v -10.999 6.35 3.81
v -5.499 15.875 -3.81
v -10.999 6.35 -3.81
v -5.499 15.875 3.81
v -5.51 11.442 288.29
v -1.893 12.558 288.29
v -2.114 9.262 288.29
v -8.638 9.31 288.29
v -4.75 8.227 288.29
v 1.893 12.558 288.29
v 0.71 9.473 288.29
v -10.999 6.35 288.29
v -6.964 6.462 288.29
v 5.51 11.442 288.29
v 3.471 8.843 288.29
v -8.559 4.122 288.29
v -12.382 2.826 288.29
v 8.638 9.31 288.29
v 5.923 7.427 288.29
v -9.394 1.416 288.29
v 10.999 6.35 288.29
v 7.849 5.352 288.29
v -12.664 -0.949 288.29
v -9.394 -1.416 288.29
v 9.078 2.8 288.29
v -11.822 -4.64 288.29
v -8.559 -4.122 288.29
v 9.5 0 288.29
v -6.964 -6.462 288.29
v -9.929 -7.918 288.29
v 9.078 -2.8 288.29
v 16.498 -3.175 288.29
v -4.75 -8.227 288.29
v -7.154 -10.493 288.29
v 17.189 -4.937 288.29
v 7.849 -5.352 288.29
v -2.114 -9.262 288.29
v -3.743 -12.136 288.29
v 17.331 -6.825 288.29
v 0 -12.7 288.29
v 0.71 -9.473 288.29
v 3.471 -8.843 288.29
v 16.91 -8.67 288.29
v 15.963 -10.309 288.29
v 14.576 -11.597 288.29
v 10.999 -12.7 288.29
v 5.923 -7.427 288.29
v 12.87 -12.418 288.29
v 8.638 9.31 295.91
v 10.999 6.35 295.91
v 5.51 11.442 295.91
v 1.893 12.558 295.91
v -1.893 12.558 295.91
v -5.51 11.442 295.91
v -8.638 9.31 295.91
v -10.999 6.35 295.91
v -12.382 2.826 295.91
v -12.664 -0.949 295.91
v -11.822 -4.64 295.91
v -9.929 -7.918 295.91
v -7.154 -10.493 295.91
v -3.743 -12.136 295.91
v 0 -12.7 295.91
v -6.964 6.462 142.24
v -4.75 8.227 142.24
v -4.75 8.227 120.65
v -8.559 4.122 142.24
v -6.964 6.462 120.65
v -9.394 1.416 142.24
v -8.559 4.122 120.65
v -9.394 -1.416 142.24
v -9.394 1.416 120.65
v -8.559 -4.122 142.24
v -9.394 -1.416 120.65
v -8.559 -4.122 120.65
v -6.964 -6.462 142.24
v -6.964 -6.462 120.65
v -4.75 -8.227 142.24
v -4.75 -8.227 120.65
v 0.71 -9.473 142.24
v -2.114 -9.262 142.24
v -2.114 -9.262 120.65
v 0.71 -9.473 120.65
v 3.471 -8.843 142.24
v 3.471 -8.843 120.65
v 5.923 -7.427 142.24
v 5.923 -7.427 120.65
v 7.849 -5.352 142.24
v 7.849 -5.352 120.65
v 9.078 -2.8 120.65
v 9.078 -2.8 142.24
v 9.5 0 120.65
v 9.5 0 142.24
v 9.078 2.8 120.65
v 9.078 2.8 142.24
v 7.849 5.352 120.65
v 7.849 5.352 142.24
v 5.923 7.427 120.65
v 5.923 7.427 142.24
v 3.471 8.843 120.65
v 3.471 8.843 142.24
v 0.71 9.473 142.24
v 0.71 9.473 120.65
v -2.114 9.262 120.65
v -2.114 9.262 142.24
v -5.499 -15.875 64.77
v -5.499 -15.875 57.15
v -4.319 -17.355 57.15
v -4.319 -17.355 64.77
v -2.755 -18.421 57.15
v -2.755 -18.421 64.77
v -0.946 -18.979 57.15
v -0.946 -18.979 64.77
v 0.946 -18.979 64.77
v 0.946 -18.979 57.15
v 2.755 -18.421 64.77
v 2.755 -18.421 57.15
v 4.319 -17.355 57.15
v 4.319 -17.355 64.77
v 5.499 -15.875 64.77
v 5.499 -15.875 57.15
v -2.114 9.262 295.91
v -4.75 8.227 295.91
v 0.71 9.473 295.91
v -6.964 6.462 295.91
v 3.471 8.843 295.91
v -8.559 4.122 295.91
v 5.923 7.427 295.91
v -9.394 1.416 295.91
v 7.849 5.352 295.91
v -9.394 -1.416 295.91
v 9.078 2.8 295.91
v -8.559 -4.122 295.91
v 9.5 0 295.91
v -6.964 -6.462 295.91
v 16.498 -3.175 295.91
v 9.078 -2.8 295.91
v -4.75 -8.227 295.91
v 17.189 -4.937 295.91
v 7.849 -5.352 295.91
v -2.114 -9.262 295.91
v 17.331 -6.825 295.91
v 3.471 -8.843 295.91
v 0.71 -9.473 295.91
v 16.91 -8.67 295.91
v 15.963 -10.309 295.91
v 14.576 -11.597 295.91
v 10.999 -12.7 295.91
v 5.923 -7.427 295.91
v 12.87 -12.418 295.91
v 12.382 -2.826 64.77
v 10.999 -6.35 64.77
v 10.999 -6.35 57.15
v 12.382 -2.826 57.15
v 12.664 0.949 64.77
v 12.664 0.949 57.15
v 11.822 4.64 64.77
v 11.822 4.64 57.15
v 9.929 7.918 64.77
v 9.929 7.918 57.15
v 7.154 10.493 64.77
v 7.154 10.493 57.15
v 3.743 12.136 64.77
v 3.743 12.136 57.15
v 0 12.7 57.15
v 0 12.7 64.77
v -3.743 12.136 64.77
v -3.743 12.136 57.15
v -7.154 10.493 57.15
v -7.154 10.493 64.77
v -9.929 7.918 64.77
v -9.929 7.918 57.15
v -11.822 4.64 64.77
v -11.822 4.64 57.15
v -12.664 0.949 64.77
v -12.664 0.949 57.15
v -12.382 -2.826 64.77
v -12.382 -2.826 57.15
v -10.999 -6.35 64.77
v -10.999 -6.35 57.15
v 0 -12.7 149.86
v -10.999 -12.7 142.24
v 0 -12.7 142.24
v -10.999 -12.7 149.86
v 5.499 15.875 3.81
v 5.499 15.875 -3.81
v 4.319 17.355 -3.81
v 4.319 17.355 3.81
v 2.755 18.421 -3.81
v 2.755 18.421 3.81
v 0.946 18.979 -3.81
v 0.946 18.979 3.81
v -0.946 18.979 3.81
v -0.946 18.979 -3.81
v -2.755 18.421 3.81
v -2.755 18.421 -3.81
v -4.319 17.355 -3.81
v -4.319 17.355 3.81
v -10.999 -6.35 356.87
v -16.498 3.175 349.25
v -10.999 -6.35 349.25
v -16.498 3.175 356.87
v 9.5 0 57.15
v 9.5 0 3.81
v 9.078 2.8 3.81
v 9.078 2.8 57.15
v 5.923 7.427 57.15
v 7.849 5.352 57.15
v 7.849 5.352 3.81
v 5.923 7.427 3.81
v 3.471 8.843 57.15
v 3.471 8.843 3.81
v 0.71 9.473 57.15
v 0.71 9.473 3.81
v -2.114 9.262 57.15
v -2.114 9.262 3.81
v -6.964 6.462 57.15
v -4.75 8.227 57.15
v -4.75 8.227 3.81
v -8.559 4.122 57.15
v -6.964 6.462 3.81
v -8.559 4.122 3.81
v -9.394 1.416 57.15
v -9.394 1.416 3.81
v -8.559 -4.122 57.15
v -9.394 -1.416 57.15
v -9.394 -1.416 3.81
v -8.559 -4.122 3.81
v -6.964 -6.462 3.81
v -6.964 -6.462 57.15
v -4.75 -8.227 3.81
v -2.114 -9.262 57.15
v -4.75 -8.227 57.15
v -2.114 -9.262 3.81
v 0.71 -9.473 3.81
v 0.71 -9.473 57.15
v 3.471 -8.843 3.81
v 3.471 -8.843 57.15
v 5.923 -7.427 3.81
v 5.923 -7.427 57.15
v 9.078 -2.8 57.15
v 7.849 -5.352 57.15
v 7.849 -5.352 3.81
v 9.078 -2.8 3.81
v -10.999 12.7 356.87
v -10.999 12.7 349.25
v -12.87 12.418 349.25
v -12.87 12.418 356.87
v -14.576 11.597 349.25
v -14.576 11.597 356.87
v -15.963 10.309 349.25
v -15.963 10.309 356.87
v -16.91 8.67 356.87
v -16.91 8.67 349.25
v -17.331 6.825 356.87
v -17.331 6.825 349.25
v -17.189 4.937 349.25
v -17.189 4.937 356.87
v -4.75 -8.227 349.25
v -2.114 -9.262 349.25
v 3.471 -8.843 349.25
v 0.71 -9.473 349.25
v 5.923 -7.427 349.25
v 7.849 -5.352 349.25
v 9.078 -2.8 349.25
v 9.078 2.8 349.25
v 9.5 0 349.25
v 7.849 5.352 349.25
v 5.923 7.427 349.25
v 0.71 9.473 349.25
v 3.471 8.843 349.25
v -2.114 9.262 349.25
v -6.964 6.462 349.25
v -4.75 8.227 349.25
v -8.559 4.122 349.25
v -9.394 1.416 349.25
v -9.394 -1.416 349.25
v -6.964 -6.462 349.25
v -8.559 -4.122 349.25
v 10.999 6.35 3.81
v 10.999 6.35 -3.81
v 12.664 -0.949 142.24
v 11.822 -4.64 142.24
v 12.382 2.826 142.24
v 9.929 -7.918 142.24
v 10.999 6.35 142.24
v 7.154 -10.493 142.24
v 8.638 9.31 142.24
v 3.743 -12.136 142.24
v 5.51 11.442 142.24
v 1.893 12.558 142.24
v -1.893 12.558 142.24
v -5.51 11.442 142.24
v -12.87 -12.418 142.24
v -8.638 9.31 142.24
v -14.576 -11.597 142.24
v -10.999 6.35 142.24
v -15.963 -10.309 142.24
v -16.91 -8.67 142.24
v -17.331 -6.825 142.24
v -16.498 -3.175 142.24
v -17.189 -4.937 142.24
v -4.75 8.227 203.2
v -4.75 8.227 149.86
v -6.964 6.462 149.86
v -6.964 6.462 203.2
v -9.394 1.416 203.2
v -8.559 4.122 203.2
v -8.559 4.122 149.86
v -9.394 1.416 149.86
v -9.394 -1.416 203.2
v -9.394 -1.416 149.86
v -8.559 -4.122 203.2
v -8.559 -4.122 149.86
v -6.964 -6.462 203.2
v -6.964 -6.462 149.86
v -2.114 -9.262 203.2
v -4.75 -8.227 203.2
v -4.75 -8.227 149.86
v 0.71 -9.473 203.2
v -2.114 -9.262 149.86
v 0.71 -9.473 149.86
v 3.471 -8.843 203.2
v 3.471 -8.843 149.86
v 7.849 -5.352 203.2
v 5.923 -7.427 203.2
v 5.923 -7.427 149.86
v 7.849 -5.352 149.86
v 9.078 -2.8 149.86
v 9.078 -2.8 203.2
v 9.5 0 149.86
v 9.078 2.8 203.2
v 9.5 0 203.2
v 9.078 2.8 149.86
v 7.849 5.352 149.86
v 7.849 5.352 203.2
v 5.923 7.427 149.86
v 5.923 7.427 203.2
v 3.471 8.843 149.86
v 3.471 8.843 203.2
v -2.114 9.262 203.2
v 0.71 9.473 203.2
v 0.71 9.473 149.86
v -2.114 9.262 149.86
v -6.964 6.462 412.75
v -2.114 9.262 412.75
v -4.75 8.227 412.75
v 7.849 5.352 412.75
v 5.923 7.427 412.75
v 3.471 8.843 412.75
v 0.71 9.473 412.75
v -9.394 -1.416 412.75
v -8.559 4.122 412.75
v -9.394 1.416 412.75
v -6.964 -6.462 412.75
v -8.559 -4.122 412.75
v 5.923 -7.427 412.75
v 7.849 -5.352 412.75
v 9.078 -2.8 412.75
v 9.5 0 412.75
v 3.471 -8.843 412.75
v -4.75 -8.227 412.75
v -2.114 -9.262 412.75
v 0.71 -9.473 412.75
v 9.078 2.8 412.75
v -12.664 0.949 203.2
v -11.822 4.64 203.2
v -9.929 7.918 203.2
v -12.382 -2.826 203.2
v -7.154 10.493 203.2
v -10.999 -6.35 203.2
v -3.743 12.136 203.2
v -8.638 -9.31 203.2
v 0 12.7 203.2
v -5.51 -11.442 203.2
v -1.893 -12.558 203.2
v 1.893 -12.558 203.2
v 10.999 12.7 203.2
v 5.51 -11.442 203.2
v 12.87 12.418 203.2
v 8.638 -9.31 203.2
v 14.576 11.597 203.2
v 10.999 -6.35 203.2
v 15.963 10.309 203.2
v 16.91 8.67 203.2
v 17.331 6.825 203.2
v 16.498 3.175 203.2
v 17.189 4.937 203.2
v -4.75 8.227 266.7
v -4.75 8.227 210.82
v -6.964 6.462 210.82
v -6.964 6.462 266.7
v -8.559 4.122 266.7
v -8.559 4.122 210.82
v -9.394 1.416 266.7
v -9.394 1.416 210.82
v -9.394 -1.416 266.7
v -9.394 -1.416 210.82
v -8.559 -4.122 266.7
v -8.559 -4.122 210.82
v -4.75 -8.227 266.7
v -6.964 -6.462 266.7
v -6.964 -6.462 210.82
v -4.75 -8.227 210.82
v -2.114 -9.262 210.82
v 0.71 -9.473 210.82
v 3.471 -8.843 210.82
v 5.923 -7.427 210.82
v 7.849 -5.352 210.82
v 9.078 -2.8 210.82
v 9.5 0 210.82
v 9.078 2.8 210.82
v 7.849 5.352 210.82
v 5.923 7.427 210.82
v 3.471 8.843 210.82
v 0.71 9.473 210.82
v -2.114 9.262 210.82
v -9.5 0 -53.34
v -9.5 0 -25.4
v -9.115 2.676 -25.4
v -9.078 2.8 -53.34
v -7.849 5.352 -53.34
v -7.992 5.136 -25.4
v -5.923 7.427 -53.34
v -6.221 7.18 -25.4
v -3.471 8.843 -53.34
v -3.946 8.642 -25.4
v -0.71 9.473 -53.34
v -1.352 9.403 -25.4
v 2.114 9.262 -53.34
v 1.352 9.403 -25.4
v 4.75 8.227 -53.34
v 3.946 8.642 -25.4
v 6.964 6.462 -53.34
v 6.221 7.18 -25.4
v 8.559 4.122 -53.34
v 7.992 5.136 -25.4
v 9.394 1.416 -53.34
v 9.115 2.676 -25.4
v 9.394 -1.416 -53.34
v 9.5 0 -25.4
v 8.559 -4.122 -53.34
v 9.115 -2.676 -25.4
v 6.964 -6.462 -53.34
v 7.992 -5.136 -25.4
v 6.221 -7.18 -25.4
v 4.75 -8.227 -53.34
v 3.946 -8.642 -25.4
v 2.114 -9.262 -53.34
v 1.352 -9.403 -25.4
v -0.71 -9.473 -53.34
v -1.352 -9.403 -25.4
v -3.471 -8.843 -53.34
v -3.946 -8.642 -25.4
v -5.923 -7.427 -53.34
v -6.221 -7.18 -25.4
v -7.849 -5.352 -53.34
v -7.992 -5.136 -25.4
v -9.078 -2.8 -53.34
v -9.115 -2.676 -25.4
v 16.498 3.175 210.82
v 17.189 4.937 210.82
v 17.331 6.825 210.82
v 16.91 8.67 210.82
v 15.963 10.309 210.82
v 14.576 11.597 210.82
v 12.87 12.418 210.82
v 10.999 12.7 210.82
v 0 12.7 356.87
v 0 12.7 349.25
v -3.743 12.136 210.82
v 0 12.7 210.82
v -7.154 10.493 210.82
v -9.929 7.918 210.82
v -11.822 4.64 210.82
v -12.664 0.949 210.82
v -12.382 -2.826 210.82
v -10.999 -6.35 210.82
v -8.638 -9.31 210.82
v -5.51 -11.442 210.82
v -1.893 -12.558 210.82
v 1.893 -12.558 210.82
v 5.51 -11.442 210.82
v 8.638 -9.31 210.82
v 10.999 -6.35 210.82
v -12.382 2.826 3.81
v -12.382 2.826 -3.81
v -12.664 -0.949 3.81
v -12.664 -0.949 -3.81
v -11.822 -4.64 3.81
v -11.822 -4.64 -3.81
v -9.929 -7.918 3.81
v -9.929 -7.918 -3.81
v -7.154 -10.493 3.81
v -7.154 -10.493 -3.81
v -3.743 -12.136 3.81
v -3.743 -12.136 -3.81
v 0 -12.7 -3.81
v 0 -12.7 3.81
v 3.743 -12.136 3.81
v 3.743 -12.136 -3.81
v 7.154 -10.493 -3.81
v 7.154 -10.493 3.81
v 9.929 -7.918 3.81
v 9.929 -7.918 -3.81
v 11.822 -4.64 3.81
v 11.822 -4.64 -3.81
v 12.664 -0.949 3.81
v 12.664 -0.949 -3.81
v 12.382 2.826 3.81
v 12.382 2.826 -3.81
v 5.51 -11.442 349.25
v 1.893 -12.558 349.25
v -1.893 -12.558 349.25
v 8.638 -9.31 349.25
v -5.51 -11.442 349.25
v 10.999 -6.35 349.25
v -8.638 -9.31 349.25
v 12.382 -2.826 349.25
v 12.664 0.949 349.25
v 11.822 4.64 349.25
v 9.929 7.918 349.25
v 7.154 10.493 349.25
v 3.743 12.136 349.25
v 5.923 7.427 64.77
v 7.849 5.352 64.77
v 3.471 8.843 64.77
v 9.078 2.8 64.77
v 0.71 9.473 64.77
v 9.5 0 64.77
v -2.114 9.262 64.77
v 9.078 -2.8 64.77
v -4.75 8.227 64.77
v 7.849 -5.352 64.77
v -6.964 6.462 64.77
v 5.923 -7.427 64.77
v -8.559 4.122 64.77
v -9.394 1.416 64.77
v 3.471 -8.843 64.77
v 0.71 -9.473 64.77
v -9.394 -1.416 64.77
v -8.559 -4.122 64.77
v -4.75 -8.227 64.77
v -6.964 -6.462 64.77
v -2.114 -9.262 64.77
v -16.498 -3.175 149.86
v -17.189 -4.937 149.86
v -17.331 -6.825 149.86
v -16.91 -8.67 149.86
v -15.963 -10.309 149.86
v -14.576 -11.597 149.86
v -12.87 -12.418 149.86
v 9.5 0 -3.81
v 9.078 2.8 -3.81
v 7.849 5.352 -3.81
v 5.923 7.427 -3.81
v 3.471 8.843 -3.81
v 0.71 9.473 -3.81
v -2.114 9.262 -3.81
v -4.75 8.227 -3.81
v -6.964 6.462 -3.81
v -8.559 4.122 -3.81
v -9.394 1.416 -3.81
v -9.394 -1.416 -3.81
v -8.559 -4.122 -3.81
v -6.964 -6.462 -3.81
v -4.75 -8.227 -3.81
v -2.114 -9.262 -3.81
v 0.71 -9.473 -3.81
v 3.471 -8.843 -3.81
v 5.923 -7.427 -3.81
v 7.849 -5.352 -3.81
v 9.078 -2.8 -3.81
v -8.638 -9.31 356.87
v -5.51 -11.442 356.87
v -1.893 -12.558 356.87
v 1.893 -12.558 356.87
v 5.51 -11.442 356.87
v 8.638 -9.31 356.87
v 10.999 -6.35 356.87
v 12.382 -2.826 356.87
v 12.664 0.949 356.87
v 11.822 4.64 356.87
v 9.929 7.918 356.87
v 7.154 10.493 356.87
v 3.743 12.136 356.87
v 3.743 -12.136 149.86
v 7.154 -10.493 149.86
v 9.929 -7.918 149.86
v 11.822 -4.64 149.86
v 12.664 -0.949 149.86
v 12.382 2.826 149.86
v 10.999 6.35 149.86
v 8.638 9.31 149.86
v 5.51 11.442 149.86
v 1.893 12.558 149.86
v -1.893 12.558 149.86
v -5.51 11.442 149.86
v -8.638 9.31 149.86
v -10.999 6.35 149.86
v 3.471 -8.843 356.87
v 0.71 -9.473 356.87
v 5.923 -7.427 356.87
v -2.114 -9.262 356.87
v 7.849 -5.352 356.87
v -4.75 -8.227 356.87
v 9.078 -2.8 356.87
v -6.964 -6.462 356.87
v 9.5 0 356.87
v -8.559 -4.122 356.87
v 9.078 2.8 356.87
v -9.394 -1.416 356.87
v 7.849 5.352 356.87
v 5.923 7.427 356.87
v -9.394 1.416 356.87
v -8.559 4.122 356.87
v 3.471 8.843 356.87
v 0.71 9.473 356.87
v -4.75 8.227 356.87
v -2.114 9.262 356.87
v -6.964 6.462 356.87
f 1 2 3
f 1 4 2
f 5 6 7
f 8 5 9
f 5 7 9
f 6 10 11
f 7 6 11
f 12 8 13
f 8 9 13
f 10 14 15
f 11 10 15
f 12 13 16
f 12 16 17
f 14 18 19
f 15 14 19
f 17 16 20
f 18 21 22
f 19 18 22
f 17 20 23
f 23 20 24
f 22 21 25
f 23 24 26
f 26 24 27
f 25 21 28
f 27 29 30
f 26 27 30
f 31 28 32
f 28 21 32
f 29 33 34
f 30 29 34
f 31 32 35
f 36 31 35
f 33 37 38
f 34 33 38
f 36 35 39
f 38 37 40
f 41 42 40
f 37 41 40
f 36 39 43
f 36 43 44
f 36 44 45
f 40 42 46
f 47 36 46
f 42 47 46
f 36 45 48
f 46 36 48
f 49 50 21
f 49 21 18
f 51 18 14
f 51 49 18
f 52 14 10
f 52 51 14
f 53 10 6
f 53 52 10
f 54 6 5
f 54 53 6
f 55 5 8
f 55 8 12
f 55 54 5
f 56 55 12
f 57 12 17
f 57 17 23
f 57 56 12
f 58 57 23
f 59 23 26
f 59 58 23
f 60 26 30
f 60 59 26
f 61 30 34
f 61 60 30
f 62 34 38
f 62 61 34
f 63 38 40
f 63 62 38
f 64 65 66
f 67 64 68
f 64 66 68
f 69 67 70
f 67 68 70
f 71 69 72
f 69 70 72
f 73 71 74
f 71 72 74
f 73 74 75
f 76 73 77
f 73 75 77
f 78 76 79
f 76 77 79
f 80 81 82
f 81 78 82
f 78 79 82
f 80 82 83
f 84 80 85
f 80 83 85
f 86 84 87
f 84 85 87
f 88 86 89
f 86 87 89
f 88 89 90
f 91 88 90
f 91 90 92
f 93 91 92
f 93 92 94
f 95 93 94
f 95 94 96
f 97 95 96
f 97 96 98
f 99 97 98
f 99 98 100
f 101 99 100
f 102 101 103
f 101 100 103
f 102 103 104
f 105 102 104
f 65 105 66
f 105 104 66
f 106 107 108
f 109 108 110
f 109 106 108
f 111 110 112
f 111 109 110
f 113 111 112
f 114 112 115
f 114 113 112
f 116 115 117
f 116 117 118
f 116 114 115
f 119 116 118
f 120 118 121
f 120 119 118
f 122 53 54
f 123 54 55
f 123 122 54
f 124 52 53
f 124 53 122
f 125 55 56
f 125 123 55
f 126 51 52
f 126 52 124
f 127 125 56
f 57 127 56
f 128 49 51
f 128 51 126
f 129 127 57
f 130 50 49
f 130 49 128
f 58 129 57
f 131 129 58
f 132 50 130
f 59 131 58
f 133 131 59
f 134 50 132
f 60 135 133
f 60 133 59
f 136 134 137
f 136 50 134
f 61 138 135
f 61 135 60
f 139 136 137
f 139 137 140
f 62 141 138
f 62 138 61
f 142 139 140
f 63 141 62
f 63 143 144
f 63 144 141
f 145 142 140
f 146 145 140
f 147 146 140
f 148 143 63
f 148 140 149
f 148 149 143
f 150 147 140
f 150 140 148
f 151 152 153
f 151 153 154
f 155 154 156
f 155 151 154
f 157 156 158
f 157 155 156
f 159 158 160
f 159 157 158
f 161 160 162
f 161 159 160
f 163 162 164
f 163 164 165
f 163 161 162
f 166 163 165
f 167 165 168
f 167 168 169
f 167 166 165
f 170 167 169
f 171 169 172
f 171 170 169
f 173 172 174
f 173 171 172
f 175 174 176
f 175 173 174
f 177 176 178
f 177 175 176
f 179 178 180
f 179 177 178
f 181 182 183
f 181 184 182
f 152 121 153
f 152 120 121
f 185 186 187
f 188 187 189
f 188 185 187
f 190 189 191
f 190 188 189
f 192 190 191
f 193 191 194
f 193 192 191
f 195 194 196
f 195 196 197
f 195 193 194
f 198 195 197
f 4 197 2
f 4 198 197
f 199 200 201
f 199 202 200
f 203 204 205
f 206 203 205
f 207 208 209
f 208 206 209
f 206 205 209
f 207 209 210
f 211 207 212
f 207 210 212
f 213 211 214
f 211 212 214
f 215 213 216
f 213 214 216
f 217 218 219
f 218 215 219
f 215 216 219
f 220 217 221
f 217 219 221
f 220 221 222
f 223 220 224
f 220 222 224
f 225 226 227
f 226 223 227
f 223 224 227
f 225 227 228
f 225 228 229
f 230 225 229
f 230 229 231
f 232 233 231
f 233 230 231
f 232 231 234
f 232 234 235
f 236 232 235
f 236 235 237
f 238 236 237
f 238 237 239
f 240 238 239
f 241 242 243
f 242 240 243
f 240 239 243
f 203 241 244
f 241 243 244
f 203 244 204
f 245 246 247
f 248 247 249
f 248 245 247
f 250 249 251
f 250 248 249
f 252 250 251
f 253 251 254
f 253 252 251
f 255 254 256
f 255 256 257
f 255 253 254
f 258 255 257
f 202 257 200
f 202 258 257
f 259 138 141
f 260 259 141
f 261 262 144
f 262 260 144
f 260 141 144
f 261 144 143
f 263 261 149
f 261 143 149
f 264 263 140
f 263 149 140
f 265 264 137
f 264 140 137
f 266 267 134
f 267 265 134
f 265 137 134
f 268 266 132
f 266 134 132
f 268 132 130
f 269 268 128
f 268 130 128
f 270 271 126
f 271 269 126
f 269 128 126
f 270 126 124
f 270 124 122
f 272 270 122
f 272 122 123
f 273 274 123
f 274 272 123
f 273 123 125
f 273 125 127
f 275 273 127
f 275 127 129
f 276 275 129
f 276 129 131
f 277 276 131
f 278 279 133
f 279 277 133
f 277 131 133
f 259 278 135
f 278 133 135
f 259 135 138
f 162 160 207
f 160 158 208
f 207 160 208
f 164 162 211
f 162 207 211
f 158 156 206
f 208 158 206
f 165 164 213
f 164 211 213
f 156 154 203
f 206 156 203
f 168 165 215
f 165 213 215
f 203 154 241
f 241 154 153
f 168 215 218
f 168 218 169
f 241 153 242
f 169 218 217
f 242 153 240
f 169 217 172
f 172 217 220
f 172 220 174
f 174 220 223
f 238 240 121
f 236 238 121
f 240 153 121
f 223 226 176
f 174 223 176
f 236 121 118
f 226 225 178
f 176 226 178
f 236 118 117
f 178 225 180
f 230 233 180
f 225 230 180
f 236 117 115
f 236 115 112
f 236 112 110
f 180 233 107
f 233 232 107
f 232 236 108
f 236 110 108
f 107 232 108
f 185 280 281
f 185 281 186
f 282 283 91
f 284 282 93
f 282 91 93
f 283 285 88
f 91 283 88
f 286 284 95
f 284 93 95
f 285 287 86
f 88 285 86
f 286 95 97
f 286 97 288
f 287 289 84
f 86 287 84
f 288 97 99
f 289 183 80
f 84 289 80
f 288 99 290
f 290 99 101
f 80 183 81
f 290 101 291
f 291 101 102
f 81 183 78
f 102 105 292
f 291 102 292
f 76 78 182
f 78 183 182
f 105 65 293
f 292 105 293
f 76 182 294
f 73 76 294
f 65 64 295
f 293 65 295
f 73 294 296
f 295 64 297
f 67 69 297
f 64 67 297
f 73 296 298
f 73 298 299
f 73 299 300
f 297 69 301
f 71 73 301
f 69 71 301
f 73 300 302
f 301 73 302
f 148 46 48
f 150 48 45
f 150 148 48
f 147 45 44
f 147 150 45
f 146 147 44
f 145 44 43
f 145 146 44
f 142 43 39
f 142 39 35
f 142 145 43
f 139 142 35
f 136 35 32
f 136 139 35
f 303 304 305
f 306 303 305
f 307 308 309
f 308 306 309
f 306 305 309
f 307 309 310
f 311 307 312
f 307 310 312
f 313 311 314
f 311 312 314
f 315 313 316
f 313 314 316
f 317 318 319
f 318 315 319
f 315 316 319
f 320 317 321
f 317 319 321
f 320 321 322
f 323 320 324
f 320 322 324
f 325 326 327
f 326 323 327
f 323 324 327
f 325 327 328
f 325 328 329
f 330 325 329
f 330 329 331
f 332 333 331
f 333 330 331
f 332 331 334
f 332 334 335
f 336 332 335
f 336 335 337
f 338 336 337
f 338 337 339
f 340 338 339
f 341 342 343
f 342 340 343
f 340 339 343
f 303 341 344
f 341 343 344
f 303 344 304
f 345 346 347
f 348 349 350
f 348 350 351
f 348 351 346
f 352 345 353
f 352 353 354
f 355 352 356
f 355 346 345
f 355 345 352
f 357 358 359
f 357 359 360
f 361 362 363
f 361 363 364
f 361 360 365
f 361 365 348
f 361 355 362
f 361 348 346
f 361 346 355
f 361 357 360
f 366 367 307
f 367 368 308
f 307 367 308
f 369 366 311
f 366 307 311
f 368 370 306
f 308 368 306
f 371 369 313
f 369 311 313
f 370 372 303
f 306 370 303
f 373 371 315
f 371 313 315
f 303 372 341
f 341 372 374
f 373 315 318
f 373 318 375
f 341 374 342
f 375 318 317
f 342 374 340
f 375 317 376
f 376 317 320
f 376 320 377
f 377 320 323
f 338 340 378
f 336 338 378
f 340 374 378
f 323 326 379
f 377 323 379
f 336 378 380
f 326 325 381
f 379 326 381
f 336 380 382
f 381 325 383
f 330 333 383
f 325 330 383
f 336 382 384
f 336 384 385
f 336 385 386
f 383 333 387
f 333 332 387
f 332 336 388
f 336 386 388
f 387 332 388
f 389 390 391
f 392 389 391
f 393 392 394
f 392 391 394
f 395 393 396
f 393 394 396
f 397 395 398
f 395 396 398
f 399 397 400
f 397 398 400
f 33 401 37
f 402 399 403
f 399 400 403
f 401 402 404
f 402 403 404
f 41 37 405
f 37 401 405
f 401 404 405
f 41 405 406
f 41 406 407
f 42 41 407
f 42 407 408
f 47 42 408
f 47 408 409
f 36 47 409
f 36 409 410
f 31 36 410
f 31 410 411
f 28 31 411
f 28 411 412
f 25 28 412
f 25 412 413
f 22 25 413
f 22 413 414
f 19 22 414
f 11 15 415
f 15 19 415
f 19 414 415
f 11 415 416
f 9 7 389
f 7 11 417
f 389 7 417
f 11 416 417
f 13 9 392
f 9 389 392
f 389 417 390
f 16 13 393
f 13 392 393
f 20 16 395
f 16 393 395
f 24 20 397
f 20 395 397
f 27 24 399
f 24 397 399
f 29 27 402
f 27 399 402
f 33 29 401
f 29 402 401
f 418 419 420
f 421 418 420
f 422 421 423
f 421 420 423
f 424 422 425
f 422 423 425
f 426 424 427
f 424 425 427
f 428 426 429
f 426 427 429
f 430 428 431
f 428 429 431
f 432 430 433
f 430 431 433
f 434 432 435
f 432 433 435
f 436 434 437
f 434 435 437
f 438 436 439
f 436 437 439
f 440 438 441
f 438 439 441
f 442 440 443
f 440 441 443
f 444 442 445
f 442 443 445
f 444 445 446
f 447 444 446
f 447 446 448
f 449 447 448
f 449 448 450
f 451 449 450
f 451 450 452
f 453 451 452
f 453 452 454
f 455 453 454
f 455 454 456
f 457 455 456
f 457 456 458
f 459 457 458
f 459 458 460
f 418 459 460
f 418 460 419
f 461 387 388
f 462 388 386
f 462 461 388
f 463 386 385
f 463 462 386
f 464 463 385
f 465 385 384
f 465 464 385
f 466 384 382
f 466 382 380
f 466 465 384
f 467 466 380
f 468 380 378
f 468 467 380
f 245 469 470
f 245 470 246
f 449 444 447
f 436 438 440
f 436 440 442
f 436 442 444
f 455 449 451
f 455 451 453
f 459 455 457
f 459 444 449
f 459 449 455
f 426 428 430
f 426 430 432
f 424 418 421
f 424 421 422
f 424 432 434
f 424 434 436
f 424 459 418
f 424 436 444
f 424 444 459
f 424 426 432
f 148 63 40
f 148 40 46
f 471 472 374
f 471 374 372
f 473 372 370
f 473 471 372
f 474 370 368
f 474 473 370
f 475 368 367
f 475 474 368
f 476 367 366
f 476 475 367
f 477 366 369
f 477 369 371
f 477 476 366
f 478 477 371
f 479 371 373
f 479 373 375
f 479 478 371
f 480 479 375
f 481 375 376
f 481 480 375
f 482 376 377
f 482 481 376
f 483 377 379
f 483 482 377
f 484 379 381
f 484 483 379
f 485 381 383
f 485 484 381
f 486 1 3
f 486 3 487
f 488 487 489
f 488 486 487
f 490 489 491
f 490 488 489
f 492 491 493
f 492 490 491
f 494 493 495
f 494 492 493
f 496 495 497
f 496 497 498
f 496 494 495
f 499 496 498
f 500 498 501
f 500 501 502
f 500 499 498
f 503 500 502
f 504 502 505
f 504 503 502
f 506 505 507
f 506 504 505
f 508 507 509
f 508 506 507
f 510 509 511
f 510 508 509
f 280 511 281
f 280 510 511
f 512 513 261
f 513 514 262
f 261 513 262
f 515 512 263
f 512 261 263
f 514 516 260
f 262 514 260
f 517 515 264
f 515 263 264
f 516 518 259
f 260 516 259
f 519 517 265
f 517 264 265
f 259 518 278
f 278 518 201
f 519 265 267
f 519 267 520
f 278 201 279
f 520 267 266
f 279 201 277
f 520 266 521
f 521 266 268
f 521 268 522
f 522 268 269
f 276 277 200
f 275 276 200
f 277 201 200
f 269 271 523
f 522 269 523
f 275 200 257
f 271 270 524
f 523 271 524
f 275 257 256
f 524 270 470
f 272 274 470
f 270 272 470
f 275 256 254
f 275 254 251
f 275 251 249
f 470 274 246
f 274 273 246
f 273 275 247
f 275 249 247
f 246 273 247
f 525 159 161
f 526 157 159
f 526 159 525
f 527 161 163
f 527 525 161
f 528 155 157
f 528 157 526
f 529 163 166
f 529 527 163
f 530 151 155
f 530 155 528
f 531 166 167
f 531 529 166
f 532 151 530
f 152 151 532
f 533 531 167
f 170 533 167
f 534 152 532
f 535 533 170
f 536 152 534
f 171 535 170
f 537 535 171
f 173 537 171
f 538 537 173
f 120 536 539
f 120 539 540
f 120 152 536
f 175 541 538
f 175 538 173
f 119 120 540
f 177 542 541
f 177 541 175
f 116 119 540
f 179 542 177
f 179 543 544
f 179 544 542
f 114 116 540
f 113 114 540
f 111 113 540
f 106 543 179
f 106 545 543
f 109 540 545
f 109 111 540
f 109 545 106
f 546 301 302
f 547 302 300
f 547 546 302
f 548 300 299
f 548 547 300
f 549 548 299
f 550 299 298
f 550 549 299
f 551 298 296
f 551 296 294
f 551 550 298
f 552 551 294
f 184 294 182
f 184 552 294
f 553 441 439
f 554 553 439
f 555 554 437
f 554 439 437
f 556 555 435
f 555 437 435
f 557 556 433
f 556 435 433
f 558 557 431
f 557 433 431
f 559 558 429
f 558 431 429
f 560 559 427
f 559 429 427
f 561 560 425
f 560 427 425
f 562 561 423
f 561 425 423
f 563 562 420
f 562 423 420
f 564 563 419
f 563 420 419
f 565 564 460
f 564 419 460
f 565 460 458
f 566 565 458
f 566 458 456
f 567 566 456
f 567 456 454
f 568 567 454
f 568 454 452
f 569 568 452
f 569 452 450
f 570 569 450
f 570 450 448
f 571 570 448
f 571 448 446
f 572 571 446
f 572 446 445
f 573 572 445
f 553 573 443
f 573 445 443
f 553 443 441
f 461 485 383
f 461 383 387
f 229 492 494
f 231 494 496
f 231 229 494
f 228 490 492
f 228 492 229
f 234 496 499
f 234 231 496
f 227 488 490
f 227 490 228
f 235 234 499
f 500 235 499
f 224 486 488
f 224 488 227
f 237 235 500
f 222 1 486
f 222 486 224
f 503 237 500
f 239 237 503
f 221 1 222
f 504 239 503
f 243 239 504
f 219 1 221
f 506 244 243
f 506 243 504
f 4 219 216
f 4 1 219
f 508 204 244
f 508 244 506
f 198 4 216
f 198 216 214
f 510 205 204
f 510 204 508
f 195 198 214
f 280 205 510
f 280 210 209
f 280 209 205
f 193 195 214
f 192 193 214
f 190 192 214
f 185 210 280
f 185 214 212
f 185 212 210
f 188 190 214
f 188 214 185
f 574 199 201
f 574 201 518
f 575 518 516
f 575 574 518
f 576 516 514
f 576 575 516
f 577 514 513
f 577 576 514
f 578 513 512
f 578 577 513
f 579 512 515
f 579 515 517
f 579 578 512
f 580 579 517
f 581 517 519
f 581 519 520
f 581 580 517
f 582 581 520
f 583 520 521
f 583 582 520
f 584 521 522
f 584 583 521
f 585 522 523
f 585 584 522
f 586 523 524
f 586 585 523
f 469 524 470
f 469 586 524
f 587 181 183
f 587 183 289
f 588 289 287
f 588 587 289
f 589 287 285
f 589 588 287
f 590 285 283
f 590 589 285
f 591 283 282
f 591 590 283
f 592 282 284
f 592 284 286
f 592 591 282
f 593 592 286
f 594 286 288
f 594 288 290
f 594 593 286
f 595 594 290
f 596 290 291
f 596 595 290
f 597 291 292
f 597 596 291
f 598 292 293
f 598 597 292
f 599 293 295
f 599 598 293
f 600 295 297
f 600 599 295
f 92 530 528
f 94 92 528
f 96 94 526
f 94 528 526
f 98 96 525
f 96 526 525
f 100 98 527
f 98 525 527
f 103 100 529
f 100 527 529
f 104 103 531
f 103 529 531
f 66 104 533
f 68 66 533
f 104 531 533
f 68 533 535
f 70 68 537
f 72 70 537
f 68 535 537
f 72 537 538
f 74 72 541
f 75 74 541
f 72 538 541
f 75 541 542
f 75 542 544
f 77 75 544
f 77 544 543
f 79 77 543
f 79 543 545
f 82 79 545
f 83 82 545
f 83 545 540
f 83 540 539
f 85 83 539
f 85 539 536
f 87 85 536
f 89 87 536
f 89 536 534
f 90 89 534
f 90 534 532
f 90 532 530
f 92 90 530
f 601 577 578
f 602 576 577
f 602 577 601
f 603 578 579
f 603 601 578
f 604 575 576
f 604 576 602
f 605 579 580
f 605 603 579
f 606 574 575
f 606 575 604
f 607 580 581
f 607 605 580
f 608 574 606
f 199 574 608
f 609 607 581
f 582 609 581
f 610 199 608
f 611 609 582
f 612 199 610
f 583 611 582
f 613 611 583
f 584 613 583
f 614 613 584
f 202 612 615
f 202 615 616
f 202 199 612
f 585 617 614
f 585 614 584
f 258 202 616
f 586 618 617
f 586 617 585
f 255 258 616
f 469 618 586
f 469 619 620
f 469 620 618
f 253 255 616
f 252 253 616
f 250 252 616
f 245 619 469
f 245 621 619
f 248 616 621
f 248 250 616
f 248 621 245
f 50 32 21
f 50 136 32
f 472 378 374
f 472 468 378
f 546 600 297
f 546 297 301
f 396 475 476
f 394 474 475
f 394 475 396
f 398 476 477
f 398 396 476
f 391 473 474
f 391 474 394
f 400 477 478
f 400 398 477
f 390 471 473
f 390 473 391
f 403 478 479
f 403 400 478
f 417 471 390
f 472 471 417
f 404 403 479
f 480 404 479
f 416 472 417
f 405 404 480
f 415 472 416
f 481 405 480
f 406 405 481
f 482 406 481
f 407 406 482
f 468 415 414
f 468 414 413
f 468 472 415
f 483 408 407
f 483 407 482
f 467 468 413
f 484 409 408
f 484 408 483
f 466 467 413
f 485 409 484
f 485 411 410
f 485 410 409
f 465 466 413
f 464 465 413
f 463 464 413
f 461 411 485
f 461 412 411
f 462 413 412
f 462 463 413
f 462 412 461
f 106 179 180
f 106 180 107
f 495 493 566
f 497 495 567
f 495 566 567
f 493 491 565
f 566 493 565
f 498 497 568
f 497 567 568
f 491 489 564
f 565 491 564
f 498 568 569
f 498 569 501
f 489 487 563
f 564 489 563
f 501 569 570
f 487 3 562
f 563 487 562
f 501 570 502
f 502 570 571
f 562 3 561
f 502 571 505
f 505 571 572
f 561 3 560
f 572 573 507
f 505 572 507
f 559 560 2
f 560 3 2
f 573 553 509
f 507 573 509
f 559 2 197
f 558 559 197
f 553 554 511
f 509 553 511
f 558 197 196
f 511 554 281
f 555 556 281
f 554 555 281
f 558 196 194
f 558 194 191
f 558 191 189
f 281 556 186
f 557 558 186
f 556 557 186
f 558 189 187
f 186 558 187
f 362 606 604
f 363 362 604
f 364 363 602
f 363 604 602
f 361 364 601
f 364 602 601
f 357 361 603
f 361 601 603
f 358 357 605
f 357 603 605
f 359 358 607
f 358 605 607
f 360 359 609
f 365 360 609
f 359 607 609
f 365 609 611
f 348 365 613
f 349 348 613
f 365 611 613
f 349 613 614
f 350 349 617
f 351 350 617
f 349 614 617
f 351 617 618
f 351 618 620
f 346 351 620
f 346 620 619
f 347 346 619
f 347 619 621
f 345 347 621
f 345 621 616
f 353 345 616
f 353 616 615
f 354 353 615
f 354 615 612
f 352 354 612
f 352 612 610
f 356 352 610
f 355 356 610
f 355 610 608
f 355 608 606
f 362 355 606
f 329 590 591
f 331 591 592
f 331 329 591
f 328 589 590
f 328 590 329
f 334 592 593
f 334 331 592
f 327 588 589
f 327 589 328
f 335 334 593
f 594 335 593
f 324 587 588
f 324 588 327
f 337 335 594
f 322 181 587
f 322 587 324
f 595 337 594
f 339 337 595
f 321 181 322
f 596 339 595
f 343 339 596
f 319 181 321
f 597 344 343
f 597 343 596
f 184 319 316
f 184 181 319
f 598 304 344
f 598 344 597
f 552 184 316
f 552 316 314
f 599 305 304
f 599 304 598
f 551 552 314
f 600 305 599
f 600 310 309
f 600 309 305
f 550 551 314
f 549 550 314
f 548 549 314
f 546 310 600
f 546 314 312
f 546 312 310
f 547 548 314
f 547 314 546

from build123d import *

# Parameters (mm, degrees)
BOSS_EXTRU_1_DEPTH           = 3.81
CORPS_D_PLACER_COPIER2_ANGLE = 180
BOSS_EXTRU_2_START           = -25.4
ESQUISSE4_R                  = 9.5
BOSS_EXTRU_2_DEPTH           = 146.05
R_P_TITION_LIN_AIRE2_COUNT   = 3
R_P_TITION_LIN_AIRE2_PITCH   = 146.05
CORPS_D_PLACER_COPIER3_ANGLE = 120
CORPS_D_PLACER_COPIER4_ANGLE = 120
BOSS_EXTRU_3_START           = 27.94
ESQUISSE5_R                  = 9.5
BOSS_EXTRU_3_DEPTH           = 27.94


with BuildPart() as part:
    # Esquisse1 → Boss.-Extru.1 (new, symmetric)
    with BuildSketch(Plane.XY):
        with BuildLine():
            Line((-5.499261314, 15.875), (-10.998522628, 6.35))
            ThreePointArc((-10.998522628, 6.35), (0, -12.7), (10.998522628, 6.35))
            Line((10.998522628, 6.35), (5.499261314, 15.875))
            ThreePointArc((5.499261314, 15.875), (0, 19.05), (-5.499261314, 15.875))
        make_face()
    extrude(amount=BOSS_EXTRU_1_DEPTH, both=True)


with BuildPart() as body_2:
    # Corps-Déplacer/Copier1: copy of part
    add(part.part.moved(Location((0, 0, 60.96))))


with BuildPart() as body_2_1:
    # Corps-Déplacer/Copier2: moved
    add(body_2.part.rotate(Axis((0, 0, 0), (0, 0, 1)), CORPS_D_PLACER_COPIER2_ANGLE))


with BuildPart() as part_1:
    add(part.part)

    add(body_2_1.part)  # Boss.-Extru.2 merges body 2
    # Esquisse4 → Boss.-Extru.2 (add)
    with BuildSketch(Plane.XY.offset(BOSS_EXTRU_2_START)):
        Circle(ESQUISSE4_R)
    extrude(amount=BOSS_EXTRU_2_DEPTH)


with BuildPart() as r_p_tition_lin_aire2_1:
    # Répétition linéaire2: pattern copy
    add(part_1.part.moved(Location(Vector(0, 0, 1) * (1 * R_P_TITION_LIN_AIRE2_PITCH))))


with BuildPart() as r_p_tition_lin_aire2_2:
    # Répétition linéaire2: pattern copy
    add(part_1.part.moved(Location(Vector(0, 0, 1) * (2 * R_P_TITION_LIN_AIRE2_PITCH))))


with BuildPart() as r_p_tition_lin_aire2_1_1:
    # Corps-Déplacer/Copier3: moved
    add(r_p_tition_lin_aire2_1.part.rotate(Axis((0, 0, 0), (0, 0, 1)), CORPS_D_PLACER_COPIER3_ANGLE))


with BuildPart() as r_p_tition_lin_aire2_2_1:
    # Corps-Déplacer/Copier4: moved
    add(r_p_tition_lin_aire2_2.part.rotate(Axis((0, 0, 0), (0, 0, -1)), CORPS_D_PLACER_COPIER4_ANGLE))


with BuildPart() as part_2:
    add(part_1.part)

    # Esquisse5 → Boss.-Extru.3 (add)
    with BuildSketch(Plane(origin=(0, 0, -25.4), x_dir=(-1, 0, 0), z_dir=(0, 0, -1)).offset(BOSS_EXTRU_3_START)):
        Circle(ESQUISSE5_R)
    extrude(amount=-BOSS_EXTRU_3_DEPTH)


with BuildPart() as r_p_tition_lin_aire2_2_2:
    add(r_p_tition_lin_aire2_2_1.part)

    # Combiner1: union Répétition linéaire2_1, part
    add(r_p_tition_lin_aire2_1_1.part)
    add(part_2.part)


solid = r_p_tition_lin_aire2_2_2.part
